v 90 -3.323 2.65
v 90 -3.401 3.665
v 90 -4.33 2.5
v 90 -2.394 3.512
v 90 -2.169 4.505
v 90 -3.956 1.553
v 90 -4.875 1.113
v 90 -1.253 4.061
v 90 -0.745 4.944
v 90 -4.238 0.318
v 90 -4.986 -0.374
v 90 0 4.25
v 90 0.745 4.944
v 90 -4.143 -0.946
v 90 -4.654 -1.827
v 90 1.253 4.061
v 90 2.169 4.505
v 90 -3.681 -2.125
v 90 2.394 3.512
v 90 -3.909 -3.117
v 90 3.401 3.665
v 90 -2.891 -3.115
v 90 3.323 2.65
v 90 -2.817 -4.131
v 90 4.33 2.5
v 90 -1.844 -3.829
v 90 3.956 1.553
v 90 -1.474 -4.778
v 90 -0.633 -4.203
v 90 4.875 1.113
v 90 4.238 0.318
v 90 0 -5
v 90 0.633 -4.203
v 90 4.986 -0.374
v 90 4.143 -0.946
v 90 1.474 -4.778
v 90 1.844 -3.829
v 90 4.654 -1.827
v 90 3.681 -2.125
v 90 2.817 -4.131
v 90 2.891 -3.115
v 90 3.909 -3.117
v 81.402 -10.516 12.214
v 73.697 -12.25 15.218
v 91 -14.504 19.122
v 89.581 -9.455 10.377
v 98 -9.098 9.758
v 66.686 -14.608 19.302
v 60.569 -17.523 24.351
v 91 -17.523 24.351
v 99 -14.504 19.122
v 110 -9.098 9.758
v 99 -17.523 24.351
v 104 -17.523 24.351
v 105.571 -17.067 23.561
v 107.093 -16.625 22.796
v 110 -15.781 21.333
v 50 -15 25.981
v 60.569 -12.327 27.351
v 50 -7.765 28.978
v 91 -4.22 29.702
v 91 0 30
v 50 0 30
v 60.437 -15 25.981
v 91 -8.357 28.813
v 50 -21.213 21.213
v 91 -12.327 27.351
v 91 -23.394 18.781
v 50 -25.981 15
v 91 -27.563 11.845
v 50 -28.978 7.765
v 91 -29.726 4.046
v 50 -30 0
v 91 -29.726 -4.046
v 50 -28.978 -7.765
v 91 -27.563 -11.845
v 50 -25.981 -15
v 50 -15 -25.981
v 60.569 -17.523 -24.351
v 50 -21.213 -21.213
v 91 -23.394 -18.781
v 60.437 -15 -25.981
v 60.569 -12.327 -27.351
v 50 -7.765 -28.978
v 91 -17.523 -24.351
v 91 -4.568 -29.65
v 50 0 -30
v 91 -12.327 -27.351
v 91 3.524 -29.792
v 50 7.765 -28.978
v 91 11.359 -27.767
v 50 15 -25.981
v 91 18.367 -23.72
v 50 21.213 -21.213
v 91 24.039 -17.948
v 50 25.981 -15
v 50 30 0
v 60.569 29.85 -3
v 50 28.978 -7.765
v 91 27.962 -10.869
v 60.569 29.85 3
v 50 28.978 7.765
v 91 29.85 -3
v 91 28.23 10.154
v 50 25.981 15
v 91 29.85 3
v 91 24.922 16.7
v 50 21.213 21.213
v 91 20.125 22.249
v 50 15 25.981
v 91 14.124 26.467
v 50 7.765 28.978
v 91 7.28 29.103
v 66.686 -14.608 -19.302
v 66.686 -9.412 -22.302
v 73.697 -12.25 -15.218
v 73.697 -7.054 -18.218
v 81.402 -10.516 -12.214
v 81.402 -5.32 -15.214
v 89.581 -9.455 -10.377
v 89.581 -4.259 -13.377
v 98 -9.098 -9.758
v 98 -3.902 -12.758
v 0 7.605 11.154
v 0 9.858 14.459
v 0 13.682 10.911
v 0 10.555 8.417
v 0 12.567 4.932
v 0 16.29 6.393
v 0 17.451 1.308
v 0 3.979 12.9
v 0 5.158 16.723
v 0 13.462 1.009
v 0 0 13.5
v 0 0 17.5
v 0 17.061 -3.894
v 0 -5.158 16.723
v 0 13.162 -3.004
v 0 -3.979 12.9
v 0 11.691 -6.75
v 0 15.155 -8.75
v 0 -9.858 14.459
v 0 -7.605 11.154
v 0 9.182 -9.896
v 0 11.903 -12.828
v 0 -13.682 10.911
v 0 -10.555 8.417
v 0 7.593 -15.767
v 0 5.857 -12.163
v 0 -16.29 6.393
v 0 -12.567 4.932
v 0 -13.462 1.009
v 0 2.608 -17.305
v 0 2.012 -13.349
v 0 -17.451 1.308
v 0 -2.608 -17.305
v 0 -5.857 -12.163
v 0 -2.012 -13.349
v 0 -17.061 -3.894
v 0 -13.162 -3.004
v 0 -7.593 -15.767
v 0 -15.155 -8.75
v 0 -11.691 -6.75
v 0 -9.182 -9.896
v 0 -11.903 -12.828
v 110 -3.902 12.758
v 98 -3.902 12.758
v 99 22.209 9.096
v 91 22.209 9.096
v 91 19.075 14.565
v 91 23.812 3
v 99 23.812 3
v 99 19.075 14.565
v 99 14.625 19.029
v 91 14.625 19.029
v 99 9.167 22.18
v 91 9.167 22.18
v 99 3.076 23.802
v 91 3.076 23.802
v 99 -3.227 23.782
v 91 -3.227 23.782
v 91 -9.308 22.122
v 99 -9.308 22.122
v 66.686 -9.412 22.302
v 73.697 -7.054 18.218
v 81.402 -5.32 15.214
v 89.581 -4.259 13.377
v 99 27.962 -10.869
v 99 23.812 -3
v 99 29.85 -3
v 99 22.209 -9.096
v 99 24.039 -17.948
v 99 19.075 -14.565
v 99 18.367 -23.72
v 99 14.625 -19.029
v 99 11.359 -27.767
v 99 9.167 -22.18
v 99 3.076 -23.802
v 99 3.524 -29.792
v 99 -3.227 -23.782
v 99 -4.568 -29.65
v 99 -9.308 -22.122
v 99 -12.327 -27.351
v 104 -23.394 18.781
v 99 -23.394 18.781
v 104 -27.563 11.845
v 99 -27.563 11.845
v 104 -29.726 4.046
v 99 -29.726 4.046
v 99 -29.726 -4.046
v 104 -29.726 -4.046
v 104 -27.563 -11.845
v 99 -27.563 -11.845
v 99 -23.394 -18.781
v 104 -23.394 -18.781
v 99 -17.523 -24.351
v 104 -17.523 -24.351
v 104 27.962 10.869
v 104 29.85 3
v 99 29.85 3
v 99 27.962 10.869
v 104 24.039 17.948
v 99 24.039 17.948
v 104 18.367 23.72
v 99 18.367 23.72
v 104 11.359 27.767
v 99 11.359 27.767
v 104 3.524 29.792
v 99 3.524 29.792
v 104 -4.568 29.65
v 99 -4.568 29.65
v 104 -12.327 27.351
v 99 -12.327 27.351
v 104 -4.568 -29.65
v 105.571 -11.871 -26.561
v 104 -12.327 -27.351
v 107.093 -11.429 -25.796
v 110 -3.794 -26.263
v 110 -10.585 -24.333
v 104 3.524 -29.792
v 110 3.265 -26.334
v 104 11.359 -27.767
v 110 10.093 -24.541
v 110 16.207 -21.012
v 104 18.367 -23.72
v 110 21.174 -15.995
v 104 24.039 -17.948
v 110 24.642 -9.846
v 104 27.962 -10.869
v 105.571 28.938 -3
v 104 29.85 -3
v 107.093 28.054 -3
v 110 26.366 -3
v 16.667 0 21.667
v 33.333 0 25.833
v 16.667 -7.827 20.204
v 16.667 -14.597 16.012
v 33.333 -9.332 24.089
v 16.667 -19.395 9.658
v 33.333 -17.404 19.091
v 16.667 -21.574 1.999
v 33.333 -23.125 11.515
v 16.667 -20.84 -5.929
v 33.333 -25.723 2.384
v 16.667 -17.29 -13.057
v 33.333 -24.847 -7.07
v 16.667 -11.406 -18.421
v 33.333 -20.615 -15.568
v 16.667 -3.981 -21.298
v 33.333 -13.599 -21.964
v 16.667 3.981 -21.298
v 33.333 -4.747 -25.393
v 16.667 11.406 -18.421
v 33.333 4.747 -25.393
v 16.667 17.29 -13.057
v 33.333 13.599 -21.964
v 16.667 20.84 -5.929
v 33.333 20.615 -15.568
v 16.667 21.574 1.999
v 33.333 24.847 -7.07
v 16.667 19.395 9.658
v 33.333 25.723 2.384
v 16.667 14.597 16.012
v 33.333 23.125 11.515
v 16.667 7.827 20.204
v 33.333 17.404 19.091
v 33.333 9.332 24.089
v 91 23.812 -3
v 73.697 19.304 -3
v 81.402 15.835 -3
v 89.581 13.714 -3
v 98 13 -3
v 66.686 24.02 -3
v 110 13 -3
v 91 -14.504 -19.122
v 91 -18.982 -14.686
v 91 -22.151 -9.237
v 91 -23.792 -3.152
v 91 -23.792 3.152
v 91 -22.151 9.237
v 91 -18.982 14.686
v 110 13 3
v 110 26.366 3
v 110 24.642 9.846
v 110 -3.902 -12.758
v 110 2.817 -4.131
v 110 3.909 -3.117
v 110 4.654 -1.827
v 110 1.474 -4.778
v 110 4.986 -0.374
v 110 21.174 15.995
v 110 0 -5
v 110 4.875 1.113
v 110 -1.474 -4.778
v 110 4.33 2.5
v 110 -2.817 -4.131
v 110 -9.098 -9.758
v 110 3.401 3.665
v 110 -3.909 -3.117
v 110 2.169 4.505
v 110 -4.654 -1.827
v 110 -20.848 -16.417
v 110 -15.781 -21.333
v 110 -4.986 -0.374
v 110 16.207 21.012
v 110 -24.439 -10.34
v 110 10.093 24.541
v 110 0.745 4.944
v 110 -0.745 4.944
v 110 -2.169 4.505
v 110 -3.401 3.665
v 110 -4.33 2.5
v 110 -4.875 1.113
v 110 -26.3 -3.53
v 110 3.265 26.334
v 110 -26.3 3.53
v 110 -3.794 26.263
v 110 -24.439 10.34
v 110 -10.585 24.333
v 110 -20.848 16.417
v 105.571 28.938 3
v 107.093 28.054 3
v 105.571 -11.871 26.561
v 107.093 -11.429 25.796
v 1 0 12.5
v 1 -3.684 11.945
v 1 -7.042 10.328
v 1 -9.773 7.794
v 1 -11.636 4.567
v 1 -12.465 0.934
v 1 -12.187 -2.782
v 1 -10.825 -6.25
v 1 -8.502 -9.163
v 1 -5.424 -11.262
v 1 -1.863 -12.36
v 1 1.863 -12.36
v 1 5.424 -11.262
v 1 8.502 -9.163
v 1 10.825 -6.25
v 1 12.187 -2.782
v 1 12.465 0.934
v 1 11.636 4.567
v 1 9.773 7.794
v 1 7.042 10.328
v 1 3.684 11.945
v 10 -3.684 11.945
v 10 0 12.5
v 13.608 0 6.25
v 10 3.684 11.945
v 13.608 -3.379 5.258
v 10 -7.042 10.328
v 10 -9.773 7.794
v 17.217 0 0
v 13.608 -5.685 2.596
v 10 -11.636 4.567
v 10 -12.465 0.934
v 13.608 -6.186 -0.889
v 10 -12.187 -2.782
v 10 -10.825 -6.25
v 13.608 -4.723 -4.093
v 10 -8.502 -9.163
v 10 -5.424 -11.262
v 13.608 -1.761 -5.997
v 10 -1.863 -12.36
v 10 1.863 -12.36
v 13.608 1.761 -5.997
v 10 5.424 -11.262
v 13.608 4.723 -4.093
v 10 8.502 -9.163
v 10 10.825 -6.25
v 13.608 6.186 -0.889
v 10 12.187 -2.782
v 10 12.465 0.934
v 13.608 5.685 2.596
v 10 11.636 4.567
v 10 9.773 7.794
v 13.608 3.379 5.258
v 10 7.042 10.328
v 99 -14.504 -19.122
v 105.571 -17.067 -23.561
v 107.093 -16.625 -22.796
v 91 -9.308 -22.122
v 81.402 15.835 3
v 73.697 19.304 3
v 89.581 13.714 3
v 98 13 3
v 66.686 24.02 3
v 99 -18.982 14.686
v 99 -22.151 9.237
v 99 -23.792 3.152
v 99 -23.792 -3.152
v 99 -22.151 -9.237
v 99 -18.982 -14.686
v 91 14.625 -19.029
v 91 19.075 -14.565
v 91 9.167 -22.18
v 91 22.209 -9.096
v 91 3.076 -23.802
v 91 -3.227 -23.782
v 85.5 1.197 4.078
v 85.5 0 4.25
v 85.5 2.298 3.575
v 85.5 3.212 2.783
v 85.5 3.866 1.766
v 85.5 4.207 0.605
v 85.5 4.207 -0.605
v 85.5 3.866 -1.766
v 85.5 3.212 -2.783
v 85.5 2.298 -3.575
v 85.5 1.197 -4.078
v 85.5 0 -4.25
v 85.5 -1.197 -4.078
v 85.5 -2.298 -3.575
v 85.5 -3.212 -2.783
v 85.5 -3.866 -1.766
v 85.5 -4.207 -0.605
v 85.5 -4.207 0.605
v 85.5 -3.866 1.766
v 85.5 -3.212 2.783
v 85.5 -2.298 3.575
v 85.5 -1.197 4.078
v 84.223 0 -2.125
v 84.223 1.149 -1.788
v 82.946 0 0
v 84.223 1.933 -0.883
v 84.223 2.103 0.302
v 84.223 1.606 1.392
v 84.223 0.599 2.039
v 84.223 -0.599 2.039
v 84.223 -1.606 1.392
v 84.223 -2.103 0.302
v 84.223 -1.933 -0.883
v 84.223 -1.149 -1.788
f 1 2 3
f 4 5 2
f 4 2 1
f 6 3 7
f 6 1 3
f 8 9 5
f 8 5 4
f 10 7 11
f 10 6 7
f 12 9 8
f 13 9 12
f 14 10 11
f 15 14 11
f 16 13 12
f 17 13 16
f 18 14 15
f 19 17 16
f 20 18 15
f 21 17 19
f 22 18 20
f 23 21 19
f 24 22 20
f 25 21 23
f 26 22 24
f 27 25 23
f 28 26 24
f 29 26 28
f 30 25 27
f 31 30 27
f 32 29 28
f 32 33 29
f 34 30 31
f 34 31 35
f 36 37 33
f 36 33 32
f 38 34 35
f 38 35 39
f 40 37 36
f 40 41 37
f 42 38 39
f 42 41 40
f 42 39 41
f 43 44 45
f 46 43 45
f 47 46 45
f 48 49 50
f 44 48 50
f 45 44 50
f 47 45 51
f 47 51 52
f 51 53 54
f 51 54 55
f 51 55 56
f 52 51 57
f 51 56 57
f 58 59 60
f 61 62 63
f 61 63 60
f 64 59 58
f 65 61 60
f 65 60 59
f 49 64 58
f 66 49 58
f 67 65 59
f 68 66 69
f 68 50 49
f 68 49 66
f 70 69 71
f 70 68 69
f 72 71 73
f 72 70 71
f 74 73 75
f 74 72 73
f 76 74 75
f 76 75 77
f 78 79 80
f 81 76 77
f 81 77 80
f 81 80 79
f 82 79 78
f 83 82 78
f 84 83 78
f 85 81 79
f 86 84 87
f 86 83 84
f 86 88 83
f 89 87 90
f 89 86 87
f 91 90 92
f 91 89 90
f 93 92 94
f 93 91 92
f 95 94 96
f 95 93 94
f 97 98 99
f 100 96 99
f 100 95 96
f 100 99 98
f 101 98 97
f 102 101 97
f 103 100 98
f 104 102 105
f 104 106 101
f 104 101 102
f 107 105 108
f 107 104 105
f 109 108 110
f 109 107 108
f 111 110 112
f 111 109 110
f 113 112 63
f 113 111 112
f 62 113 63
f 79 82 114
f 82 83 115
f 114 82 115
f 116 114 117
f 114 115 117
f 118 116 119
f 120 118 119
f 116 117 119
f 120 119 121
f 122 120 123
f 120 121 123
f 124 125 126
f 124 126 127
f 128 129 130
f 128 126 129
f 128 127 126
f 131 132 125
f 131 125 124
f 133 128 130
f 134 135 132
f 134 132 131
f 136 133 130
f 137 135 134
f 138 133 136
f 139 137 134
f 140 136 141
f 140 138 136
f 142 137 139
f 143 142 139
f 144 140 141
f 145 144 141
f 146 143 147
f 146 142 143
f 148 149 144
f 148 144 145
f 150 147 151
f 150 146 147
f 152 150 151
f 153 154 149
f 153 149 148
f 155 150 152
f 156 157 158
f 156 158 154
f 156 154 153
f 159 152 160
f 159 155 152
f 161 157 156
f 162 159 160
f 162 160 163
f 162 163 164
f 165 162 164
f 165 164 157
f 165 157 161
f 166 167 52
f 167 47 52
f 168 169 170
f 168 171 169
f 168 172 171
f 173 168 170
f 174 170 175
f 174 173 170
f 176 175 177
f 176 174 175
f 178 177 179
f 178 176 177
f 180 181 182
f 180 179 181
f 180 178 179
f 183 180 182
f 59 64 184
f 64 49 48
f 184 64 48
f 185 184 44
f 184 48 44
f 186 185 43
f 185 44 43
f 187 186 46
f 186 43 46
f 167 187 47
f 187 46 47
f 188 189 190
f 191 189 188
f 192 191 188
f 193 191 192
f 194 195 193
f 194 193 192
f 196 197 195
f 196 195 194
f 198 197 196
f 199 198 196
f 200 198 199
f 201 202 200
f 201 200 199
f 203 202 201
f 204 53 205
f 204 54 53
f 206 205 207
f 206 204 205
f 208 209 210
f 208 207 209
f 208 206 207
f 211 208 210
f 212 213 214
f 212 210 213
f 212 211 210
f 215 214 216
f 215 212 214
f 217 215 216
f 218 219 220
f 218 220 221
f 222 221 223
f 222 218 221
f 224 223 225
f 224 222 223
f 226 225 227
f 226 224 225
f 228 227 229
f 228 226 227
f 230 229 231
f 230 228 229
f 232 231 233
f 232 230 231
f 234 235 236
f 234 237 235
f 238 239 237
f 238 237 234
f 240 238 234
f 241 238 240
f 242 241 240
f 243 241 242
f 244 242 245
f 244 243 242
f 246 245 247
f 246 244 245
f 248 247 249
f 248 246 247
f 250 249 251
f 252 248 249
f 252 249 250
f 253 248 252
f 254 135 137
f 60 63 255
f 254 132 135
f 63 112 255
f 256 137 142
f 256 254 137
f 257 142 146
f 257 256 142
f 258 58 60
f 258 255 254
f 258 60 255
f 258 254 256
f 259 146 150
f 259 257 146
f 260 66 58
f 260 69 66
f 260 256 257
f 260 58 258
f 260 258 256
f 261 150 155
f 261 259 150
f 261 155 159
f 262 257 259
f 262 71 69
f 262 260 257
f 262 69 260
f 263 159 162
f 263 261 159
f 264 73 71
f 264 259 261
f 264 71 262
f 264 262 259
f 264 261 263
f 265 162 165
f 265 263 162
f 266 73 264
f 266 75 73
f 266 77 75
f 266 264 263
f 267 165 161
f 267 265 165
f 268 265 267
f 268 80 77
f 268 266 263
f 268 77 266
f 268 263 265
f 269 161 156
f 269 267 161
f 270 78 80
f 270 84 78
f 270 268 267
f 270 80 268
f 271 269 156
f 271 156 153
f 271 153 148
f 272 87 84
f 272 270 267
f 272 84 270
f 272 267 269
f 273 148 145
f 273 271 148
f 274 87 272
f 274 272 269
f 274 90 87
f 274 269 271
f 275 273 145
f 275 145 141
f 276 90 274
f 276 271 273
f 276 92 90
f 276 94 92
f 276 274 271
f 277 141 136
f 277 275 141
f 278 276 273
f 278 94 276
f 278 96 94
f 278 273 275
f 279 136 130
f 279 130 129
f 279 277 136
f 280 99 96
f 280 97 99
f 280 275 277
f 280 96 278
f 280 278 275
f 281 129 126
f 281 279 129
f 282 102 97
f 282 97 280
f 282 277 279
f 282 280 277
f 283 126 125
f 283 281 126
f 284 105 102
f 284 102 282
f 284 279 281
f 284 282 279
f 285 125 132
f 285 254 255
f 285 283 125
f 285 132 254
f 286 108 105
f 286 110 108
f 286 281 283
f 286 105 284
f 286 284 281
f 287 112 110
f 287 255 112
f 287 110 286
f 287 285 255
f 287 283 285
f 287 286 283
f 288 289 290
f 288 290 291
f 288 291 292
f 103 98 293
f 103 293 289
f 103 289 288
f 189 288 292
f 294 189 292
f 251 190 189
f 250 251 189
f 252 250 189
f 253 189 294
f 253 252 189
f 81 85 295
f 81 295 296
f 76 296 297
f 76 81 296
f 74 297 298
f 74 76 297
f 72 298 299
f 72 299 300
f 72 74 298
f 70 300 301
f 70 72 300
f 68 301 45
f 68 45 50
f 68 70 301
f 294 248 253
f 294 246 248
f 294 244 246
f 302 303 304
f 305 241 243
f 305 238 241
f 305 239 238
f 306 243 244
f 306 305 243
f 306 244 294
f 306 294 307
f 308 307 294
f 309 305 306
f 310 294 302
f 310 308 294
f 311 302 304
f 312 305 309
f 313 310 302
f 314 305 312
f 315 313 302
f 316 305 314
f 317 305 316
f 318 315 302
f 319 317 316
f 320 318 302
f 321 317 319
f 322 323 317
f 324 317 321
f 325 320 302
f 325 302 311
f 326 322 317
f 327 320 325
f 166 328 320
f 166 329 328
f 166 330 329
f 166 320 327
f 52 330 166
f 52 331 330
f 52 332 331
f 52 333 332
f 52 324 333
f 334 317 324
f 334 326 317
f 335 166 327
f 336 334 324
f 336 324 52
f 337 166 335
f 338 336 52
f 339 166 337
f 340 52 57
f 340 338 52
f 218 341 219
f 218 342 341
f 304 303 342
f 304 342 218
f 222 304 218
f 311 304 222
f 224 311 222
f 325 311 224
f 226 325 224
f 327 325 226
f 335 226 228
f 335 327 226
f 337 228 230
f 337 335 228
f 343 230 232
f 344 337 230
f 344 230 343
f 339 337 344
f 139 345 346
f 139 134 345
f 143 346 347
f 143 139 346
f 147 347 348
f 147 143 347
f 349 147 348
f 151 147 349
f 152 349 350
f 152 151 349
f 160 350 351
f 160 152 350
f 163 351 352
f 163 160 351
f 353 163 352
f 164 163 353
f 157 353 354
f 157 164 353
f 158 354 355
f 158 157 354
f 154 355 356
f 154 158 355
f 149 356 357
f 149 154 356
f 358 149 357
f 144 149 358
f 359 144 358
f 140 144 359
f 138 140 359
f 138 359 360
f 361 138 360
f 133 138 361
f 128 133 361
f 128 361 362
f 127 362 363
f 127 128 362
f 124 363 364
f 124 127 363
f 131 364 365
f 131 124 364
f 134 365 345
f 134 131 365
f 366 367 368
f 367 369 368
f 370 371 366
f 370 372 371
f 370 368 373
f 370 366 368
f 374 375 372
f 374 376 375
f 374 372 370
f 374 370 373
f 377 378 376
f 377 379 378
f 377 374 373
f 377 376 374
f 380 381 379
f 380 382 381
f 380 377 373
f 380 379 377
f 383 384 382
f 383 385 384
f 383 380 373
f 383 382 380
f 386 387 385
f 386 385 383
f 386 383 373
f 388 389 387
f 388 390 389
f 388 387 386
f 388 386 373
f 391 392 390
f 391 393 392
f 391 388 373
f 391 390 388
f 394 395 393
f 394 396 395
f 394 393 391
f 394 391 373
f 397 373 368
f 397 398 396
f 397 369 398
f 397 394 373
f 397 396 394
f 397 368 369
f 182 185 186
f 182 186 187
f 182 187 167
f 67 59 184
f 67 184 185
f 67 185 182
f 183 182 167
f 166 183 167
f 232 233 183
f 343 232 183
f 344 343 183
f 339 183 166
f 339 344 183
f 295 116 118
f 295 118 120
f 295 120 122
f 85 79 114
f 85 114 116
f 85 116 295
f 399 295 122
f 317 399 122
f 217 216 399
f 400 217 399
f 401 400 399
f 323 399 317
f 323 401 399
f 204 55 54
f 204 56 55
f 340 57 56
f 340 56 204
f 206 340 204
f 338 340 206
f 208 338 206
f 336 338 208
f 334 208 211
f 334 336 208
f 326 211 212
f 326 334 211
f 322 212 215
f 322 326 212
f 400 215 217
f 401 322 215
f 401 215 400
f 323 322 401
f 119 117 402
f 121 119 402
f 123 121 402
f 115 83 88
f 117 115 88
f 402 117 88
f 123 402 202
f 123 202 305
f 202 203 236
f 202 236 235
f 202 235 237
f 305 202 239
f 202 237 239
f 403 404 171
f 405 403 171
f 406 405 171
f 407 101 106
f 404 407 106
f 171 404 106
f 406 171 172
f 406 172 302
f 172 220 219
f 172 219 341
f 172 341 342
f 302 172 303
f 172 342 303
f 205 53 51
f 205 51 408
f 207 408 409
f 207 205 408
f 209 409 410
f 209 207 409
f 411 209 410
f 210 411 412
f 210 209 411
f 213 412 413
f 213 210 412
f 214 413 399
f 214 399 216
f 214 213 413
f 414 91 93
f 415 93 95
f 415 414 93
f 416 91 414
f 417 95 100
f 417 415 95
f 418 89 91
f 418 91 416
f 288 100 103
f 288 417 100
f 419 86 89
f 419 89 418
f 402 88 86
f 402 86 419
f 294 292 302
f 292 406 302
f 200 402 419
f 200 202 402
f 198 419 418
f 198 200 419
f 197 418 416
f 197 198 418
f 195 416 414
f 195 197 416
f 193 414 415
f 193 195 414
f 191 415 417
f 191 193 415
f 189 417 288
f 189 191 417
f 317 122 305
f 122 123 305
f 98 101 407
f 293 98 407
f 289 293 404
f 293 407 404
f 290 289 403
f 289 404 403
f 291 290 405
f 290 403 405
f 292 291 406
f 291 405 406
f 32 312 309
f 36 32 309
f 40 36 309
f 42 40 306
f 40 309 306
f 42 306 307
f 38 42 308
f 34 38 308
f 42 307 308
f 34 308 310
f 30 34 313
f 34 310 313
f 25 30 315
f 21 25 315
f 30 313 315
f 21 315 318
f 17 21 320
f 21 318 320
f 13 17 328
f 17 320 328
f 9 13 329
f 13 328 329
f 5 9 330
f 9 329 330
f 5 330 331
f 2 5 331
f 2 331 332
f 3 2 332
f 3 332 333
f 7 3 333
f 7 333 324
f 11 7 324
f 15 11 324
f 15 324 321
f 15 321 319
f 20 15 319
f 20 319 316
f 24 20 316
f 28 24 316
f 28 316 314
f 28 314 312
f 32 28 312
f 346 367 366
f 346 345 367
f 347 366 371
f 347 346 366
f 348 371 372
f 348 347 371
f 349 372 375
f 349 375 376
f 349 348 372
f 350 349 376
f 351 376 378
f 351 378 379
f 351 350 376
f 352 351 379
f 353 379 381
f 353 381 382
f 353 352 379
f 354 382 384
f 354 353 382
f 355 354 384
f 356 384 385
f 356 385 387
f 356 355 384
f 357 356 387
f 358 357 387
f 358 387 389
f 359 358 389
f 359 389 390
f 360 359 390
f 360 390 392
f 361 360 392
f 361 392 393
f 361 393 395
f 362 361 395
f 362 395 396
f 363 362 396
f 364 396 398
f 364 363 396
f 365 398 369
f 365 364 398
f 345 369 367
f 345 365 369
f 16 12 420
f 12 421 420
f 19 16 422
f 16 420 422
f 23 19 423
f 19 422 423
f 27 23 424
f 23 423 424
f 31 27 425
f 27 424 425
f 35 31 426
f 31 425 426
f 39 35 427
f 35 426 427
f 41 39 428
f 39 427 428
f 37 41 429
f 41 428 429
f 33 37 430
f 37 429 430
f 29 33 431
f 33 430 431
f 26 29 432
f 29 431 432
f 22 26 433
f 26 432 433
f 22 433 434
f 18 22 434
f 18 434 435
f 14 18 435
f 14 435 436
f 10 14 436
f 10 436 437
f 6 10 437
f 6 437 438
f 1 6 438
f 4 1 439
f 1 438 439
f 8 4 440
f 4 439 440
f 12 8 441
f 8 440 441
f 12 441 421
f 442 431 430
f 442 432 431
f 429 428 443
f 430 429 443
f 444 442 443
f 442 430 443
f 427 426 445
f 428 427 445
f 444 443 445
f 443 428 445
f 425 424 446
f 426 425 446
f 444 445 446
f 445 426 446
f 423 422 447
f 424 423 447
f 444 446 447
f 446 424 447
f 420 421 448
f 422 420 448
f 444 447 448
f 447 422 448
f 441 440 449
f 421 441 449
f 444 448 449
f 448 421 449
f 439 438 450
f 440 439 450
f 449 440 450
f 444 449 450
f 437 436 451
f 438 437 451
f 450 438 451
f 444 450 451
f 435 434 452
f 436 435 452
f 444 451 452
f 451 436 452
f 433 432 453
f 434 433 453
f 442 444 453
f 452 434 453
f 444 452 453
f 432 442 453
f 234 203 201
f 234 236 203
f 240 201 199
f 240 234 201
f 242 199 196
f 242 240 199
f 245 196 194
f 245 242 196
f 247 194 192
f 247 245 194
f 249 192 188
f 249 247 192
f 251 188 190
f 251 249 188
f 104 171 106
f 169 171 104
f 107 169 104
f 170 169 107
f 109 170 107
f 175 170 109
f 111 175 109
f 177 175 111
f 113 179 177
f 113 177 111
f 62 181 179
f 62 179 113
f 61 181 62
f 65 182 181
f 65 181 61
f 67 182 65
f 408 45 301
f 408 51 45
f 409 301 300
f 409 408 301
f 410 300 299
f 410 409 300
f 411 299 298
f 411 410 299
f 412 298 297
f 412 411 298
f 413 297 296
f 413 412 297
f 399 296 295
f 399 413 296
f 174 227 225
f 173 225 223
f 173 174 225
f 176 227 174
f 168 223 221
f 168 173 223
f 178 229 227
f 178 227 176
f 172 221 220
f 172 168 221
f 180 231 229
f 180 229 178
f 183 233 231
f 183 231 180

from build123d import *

# Parameters (mm, degrees)
CUT_EXTRUDE1_DEPTH           = 3
CIRPATTERN1_COUNT            = 3
M10_TAPPED_HOLE1_D           = 8.5
M10_TAPPED_HOLE1_DEPTH       = 24.5
M10_TAPPED_HOLE1_CBORE_D     = 10
M10_TAPPED_HOLE1_CBORE_DEPTH = 20
M10_TAPPED_HOLE1_TIP         = 2.553657631


with BuildPart() as part:
    # Sketch1 → Revolve1 (revolve)
    with BuildSketch(Plane.XY, mode=Mode.PRIVATE) as revolve1_sk:
        Polygon((0, 13.5), (0, 17.5), (50, 30), (91, 30), (91, 24), (99, 24), (99, 30), (104, 30), (110, 26.535898385), (110, 0), (17.216878365, 0), (10, 12.5), (1, 12.5), align=None)
    revolve(revolve1_sk.sketch.rotate(Axis((0, 0, 0), (1, 0, 0)), 90), axis=Axis((0, 0, 0), (1, 0, 0)))

    # Sketch2 → Cut-Extrude1 (cut, symmetric)
    with BuildSketch(Plane.XY):
        with BuildLine():
            Line((98, 13), (110, 13))
            Line((110, 13), (110, 30))
            Line((110, 30), (60.436720058, 30))
            ThreePointArc((60.436720058, 30), (77.384471872, 17.447832104), (98, 13))
        make_face()
    cut_extrude1 = extrude(amount=CUT_EXTRUDE1_DEPTH, both=True, mode=Mode.SUBTRACT)

    # CirPattern1: Cut-Extrude1 ×3 about axis
    cirpattern1_axis = Axis((0, 0, 0), (1, 0, 0))
    for i in range(1, CIRPATTERN1_COUNT):
        add(cut_extrude1.rotate(cirpattern1_axis, i * 360 / CIRPATTERN1_COUNT), mode=Mode.SUBTRACT)

    # M10 Tapped Hole1
    with Locations(Plane(origin=(110, 0, 0), x_dir=(0, 0, -1), z_dir=(1, 0, 0))):
        with Locations((0, 0)):
            CounterBoreHole(M10_TAPPED_HOLE1_D / 2, M10_TAPPED_HOLE1_CBORE_D / 2, M10_TAPPED_HOLE1_CBORE_DEPTH, depth=M10_TAPPED_HOLE1_DEPTH)
            with Locations((0, 0, -(M10_TAPPED_HOLE1_DEPTH + M10_TAPPED_HOLE1_TIP / 2))):  # 118° drill point
                Cone(0, M10_TAPPED_HOLE1_D / 2, M10_TAPPED_HOLE1_TIP, mode=Mode.SUBTRACT)


solid = part.part
